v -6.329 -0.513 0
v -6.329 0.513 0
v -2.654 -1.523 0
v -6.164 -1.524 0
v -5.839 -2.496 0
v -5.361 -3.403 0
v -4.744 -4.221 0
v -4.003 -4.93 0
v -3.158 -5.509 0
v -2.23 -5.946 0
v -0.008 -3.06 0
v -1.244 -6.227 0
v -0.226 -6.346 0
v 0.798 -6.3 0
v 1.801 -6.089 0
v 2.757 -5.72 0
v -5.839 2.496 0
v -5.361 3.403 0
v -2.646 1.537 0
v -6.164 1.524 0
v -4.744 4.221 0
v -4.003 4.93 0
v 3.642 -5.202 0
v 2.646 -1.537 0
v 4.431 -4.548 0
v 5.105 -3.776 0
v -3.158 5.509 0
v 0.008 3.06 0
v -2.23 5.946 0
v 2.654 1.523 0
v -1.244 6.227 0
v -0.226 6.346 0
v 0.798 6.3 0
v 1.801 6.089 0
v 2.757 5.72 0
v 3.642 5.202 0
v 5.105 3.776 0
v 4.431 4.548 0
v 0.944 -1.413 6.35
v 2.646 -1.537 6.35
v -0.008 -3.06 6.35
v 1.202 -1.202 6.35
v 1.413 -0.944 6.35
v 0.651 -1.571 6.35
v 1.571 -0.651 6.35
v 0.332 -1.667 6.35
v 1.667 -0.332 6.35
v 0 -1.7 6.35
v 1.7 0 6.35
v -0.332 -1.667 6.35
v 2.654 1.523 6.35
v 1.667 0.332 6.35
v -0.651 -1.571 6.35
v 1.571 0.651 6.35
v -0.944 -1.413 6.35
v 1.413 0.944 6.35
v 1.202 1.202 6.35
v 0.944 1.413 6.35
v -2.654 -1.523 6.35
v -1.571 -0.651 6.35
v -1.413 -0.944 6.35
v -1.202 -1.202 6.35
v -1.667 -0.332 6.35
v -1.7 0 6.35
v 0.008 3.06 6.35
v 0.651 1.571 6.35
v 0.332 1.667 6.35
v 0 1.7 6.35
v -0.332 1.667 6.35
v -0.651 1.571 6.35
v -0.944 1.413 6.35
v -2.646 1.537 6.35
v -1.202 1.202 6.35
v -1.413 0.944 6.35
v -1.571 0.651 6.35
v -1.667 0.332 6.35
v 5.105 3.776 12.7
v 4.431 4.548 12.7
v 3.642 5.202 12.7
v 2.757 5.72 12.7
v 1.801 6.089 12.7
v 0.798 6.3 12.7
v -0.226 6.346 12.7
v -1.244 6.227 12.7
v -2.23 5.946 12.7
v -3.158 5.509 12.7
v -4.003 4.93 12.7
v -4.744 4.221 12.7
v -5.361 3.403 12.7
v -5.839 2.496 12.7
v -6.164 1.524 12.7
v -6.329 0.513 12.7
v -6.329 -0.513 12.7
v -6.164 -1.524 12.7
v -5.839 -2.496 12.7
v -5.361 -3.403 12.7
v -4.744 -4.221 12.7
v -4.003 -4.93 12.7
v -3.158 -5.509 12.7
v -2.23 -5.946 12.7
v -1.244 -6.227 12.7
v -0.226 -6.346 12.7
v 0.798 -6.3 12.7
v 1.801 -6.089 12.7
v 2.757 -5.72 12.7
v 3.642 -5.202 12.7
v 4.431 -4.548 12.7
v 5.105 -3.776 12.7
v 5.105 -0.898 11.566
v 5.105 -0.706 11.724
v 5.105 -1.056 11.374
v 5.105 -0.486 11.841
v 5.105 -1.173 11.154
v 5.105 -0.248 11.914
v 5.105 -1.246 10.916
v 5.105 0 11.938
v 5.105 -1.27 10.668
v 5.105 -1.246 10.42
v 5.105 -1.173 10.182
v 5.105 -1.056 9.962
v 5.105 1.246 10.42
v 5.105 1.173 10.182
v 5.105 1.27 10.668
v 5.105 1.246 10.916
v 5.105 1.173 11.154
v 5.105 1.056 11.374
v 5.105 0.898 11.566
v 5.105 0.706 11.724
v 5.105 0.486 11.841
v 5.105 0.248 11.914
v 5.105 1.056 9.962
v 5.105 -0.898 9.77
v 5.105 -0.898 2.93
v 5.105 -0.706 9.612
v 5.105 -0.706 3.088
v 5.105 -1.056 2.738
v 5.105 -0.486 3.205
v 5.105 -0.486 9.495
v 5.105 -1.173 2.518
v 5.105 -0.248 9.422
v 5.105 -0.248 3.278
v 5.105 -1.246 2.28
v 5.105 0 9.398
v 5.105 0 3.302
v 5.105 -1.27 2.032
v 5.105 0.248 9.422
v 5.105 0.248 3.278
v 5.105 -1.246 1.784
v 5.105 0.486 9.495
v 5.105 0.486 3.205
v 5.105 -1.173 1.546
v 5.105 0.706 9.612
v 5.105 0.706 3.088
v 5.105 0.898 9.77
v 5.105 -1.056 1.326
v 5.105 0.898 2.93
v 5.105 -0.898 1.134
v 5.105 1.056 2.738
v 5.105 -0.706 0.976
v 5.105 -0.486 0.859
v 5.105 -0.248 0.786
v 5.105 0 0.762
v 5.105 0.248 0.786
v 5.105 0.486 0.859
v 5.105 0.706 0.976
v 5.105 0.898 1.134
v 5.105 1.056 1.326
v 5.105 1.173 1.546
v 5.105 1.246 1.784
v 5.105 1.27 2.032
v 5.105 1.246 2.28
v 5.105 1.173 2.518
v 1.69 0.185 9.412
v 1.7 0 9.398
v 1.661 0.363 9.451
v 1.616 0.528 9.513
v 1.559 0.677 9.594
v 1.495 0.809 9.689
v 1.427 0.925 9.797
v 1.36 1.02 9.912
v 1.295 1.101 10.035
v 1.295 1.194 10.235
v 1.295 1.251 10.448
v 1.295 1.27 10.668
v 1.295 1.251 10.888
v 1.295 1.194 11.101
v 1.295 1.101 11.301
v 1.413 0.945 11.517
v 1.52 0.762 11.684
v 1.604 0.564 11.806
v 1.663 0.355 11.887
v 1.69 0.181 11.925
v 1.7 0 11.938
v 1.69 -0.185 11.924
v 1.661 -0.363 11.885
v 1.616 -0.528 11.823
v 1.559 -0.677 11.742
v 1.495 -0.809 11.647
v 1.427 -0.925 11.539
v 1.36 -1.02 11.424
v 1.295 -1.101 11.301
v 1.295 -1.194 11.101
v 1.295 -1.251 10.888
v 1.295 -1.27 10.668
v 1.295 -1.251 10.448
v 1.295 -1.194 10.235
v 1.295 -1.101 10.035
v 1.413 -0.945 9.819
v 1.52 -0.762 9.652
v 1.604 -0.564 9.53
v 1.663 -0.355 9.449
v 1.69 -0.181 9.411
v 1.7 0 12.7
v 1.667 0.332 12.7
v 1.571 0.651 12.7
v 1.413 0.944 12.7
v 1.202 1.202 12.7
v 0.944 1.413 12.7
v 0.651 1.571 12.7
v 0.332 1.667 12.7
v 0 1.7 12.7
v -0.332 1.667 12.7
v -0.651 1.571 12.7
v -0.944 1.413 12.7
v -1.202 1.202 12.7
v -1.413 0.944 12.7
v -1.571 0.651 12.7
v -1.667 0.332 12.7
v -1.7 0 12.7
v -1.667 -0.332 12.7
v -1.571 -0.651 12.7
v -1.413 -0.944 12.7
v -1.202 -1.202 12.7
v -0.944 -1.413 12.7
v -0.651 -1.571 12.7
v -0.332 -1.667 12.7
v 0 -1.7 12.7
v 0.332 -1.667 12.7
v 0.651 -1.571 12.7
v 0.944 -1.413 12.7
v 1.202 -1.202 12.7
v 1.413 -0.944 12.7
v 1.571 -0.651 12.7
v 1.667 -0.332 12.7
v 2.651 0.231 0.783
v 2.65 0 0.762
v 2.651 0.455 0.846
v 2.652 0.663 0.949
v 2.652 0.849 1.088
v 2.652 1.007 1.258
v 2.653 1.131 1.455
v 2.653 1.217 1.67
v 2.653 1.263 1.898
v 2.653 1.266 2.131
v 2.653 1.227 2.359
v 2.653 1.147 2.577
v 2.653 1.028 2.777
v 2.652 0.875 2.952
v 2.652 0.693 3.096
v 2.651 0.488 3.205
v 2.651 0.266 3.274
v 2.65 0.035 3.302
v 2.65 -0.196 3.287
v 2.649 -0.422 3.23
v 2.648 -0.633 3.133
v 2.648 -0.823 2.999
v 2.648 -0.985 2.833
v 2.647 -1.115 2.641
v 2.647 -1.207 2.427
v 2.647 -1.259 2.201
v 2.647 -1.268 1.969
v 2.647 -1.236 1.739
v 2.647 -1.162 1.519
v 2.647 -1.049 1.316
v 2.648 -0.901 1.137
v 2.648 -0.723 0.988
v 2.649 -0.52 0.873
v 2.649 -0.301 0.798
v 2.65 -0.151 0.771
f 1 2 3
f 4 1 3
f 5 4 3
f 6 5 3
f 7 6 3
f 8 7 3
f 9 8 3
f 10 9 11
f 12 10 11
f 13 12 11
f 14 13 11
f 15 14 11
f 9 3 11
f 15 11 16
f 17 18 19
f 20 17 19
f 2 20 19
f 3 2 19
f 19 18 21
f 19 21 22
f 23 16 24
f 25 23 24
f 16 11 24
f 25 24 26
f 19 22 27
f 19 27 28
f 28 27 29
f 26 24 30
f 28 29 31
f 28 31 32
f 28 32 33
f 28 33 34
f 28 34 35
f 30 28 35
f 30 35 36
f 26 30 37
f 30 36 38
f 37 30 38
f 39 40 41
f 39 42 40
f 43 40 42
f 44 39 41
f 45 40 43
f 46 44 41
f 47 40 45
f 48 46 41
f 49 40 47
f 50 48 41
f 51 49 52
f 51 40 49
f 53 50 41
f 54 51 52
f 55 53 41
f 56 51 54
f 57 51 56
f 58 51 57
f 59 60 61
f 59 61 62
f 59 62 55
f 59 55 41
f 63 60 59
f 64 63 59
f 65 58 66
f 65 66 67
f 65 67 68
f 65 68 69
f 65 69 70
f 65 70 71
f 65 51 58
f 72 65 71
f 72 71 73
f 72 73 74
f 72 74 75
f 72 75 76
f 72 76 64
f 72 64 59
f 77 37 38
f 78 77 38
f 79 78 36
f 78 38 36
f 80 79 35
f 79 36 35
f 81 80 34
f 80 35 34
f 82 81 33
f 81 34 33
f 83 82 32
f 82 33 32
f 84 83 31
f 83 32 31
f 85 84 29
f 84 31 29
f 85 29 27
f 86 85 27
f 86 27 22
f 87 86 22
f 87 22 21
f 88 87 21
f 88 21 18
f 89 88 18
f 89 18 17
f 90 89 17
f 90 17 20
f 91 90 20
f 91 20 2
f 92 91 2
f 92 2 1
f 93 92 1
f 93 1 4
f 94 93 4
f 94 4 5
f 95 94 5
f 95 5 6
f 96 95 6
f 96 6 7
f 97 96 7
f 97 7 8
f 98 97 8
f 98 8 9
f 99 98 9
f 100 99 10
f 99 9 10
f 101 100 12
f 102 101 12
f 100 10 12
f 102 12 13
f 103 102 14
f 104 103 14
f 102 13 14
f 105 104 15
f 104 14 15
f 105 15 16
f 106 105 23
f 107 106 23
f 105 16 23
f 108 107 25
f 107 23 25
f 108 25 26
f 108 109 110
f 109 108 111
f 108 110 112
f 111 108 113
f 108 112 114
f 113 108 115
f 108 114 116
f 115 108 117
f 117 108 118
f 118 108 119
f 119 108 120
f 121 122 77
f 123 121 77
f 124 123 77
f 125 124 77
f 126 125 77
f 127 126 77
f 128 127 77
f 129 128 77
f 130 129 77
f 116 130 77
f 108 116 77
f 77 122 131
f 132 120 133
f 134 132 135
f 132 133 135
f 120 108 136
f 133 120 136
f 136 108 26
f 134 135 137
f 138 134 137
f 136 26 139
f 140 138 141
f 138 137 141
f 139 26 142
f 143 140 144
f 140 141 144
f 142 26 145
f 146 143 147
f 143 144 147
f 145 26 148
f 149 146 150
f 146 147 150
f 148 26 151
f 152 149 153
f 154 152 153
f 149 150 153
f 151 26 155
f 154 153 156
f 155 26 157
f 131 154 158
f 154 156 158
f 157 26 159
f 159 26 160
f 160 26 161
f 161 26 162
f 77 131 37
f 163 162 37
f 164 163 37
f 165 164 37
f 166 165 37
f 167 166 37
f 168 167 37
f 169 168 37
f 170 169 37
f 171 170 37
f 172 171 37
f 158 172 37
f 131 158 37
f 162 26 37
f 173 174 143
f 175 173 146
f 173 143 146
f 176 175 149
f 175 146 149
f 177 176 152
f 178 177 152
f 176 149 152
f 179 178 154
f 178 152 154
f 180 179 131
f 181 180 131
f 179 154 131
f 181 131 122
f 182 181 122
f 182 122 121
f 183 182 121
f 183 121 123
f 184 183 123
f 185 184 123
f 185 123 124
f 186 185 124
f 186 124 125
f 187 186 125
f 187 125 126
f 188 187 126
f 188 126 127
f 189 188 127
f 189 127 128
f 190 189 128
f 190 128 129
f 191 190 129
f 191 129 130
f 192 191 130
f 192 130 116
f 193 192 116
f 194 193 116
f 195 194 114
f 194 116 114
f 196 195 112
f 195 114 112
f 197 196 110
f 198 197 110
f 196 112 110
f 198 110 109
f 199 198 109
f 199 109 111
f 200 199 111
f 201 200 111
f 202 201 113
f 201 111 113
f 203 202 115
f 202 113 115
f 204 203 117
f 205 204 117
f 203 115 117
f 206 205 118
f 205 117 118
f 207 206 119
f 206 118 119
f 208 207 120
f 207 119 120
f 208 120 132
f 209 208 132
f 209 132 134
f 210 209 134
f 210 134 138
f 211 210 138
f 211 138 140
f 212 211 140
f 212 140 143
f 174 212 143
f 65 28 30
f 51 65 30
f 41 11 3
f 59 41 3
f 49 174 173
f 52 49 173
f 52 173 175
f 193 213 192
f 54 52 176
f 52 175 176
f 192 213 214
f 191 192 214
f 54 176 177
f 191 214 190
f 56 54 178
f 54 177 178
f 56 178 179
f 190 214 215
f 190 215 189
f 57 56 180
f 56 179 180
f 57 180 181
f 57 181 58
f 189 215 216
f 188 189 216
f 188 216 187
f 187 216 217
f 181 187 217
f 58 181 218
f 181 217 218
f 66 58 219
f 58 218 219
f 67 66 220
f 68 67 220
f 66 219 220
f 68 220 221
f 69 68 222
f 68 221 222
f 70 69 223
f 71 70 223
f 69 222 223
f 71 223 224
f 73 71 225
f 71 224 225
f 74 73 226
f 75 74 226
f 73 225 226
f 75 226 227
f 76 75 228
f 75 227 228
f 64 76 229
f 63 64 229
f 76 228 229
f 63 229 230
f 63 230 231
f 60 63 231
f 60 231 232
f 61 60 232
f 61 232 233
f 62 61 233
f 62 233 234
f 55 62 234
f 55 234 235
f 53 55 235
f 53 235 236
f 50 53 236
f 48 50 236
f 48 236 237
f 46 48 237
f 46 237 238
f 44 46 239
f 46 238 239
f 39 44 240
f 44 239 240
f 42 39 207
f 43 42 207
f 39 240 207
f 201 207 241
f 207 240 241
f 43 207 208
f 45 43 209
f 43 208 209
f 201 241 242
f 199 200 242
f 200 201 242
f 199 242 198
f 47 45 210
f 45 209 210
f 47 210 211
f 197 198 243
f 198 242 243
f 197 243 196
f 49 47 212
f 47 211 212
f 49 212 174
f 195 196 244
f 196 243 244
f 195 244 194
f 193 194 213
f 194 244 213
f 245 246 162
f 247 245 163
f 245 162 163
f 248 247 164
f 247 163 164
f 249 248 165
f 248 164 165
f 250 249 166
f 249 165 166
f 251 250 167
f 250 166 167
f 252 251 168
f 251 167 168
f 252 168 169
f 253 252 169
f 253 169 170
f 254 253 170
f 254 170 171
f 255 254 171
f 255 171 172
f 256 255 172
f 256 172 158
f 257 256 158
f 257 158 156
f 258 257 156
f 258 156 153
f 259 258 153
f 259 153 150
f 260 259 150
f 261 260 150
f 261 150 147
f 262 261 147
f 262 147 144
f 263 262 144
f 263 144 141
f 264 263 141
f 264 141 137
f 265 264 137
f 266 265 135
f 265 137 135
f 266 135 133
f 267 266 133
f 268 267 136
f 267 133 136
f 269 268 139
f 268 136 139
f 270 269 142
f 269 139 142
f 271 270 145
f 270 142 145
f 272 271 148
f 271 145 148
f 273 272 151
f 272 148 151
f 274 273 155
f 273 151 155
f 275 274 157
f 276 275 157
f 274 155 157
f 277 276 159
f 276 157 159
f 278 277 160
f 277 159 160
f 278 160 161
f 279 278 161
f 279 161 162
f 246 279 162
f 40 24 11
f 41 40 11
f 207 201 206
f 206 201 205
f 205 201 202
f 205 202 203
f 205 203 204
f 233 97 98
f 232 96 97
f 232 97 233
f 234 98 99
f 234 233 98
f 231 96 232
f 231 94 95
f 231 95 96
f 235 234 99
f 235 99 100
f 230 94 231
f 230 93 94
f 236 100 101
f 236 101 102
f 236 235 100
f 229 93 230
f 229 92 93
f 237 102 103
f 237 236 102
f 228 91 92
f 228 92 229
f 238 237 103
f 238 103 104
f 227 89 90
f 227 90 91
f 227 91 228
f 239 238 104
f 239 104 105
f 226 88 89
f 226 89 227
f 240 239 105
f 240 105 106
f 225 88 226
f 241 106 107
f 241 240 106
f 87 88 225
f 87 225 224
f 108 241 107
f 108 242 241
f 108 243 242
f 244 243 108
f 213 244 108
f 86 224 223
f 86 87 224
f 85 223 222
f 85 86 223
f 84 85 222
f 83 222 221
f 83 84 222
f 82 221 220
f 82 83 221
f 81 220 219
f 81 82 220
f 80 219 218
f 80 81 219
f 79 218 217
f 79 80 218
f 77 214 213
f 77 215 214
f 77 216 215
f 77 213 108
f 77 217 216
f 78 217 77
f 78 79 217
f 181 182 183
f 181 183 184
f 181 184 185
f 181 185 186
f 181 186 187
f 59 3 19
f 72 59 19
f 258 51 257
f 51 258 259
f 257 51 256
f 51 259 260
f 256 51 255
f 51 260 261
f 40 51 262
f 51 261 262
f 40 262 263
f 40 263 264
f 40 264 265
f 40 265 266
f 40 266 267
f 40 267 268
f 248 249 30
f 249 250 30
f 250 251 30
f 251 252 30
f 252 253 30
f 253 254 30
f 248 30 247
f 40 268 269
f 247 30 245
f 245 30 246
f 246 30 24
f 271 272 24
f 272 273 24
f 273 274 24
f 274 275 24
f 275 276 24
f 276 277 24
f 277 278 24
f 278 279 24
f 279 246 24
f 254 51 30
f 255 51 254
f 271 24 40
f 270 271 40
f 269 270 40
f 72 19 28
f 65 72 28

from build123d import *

# Parameters (mm, degrees)
SKETCH1_R           = 6.35
BOSS_EXTRUDE1_DEPTH = 12.7
SKETCH2_R           = 1.7
CUT_EXTRUDE1_DEPTH  = 6.35
CUT_EXTRUDE2_DEPTH  = 6.35
SKETCH4_W           = 3.114007597
SKETCH4_H           = 7.898709862
CUT_EXTRUDE3_DEPTH  = 14.224
SKETCH5_R           = 1.27
CUT_EXTRUDE4_DEPTH  = 3.81


with BuildPart() as part:
    # Sketch1 → Boss-Extrude1 (new body)
    with BuildSketch(Plane.XY):
        Circle(SKETCH1_R)
    extrude(amount=BOSS_EXTRUDE1_DEPTH)

    # Sketch2 → Cut-Extrude1 (cut)
    with BuildSketch(Plane.XY.offset(12.7)):
        Circle(SKETCH2_R)
    extrude(amount=-CUT_EXTRUDE1_DEPTH, mode=Mode.SUBTRACT)

    # Sketch3 → Cut-Extrude2 (cut)
    with BuildSketch(Plane(origin=(0, 0, 0), x_dir=(-1, 0, 0), z_dir=(0, 0, -1))):
        Polygon((-2.646216495, -1.536512804), (0.007550874, -3.05994711), (2.653767369, -1.523434307), (2.646216495, 1.536512804), (-0.007550874, 3.05994711), (-2.653767369, 1.523434307), align=None)
    extrude(amount=-CUT_EXTRUDE2_DEPTH, mode=Mode.SUBTRACT)

    # Sketch4 → Cut-Extrude3 (cut)
    with BuildSketch(Plane(origin=(0, 0, 0), x_dir=(-1, 0, 0), z_dir=(0, 0, -1))):
        with Locations((-6.6621984, 0.173181196)):
            Rectangle(SKETCH4_W, SKETCH4_H)
    extrude(amount=-CUT_EXTRUDE3_DEPTH, mode=Mode.SUBTRACT)

    # Sketch5 → Cut-Extrude4 (cut)
    with BuildSketch(Plane(origin=(5.105194602, 0, 0), x_dir=(0, 0, -1), z_dir=(1, 0, 0))):
        with Locations((-10.668, 0)):
            Circle(SKETCH5_R)
        with Locations((-2.032, 0)):
            Circle(SKETCH5_R)
    extrude(amount=-CUT_EXTRUDE4_DEPTH, mode=Mode.SUBTRACT)


solid = part.part
